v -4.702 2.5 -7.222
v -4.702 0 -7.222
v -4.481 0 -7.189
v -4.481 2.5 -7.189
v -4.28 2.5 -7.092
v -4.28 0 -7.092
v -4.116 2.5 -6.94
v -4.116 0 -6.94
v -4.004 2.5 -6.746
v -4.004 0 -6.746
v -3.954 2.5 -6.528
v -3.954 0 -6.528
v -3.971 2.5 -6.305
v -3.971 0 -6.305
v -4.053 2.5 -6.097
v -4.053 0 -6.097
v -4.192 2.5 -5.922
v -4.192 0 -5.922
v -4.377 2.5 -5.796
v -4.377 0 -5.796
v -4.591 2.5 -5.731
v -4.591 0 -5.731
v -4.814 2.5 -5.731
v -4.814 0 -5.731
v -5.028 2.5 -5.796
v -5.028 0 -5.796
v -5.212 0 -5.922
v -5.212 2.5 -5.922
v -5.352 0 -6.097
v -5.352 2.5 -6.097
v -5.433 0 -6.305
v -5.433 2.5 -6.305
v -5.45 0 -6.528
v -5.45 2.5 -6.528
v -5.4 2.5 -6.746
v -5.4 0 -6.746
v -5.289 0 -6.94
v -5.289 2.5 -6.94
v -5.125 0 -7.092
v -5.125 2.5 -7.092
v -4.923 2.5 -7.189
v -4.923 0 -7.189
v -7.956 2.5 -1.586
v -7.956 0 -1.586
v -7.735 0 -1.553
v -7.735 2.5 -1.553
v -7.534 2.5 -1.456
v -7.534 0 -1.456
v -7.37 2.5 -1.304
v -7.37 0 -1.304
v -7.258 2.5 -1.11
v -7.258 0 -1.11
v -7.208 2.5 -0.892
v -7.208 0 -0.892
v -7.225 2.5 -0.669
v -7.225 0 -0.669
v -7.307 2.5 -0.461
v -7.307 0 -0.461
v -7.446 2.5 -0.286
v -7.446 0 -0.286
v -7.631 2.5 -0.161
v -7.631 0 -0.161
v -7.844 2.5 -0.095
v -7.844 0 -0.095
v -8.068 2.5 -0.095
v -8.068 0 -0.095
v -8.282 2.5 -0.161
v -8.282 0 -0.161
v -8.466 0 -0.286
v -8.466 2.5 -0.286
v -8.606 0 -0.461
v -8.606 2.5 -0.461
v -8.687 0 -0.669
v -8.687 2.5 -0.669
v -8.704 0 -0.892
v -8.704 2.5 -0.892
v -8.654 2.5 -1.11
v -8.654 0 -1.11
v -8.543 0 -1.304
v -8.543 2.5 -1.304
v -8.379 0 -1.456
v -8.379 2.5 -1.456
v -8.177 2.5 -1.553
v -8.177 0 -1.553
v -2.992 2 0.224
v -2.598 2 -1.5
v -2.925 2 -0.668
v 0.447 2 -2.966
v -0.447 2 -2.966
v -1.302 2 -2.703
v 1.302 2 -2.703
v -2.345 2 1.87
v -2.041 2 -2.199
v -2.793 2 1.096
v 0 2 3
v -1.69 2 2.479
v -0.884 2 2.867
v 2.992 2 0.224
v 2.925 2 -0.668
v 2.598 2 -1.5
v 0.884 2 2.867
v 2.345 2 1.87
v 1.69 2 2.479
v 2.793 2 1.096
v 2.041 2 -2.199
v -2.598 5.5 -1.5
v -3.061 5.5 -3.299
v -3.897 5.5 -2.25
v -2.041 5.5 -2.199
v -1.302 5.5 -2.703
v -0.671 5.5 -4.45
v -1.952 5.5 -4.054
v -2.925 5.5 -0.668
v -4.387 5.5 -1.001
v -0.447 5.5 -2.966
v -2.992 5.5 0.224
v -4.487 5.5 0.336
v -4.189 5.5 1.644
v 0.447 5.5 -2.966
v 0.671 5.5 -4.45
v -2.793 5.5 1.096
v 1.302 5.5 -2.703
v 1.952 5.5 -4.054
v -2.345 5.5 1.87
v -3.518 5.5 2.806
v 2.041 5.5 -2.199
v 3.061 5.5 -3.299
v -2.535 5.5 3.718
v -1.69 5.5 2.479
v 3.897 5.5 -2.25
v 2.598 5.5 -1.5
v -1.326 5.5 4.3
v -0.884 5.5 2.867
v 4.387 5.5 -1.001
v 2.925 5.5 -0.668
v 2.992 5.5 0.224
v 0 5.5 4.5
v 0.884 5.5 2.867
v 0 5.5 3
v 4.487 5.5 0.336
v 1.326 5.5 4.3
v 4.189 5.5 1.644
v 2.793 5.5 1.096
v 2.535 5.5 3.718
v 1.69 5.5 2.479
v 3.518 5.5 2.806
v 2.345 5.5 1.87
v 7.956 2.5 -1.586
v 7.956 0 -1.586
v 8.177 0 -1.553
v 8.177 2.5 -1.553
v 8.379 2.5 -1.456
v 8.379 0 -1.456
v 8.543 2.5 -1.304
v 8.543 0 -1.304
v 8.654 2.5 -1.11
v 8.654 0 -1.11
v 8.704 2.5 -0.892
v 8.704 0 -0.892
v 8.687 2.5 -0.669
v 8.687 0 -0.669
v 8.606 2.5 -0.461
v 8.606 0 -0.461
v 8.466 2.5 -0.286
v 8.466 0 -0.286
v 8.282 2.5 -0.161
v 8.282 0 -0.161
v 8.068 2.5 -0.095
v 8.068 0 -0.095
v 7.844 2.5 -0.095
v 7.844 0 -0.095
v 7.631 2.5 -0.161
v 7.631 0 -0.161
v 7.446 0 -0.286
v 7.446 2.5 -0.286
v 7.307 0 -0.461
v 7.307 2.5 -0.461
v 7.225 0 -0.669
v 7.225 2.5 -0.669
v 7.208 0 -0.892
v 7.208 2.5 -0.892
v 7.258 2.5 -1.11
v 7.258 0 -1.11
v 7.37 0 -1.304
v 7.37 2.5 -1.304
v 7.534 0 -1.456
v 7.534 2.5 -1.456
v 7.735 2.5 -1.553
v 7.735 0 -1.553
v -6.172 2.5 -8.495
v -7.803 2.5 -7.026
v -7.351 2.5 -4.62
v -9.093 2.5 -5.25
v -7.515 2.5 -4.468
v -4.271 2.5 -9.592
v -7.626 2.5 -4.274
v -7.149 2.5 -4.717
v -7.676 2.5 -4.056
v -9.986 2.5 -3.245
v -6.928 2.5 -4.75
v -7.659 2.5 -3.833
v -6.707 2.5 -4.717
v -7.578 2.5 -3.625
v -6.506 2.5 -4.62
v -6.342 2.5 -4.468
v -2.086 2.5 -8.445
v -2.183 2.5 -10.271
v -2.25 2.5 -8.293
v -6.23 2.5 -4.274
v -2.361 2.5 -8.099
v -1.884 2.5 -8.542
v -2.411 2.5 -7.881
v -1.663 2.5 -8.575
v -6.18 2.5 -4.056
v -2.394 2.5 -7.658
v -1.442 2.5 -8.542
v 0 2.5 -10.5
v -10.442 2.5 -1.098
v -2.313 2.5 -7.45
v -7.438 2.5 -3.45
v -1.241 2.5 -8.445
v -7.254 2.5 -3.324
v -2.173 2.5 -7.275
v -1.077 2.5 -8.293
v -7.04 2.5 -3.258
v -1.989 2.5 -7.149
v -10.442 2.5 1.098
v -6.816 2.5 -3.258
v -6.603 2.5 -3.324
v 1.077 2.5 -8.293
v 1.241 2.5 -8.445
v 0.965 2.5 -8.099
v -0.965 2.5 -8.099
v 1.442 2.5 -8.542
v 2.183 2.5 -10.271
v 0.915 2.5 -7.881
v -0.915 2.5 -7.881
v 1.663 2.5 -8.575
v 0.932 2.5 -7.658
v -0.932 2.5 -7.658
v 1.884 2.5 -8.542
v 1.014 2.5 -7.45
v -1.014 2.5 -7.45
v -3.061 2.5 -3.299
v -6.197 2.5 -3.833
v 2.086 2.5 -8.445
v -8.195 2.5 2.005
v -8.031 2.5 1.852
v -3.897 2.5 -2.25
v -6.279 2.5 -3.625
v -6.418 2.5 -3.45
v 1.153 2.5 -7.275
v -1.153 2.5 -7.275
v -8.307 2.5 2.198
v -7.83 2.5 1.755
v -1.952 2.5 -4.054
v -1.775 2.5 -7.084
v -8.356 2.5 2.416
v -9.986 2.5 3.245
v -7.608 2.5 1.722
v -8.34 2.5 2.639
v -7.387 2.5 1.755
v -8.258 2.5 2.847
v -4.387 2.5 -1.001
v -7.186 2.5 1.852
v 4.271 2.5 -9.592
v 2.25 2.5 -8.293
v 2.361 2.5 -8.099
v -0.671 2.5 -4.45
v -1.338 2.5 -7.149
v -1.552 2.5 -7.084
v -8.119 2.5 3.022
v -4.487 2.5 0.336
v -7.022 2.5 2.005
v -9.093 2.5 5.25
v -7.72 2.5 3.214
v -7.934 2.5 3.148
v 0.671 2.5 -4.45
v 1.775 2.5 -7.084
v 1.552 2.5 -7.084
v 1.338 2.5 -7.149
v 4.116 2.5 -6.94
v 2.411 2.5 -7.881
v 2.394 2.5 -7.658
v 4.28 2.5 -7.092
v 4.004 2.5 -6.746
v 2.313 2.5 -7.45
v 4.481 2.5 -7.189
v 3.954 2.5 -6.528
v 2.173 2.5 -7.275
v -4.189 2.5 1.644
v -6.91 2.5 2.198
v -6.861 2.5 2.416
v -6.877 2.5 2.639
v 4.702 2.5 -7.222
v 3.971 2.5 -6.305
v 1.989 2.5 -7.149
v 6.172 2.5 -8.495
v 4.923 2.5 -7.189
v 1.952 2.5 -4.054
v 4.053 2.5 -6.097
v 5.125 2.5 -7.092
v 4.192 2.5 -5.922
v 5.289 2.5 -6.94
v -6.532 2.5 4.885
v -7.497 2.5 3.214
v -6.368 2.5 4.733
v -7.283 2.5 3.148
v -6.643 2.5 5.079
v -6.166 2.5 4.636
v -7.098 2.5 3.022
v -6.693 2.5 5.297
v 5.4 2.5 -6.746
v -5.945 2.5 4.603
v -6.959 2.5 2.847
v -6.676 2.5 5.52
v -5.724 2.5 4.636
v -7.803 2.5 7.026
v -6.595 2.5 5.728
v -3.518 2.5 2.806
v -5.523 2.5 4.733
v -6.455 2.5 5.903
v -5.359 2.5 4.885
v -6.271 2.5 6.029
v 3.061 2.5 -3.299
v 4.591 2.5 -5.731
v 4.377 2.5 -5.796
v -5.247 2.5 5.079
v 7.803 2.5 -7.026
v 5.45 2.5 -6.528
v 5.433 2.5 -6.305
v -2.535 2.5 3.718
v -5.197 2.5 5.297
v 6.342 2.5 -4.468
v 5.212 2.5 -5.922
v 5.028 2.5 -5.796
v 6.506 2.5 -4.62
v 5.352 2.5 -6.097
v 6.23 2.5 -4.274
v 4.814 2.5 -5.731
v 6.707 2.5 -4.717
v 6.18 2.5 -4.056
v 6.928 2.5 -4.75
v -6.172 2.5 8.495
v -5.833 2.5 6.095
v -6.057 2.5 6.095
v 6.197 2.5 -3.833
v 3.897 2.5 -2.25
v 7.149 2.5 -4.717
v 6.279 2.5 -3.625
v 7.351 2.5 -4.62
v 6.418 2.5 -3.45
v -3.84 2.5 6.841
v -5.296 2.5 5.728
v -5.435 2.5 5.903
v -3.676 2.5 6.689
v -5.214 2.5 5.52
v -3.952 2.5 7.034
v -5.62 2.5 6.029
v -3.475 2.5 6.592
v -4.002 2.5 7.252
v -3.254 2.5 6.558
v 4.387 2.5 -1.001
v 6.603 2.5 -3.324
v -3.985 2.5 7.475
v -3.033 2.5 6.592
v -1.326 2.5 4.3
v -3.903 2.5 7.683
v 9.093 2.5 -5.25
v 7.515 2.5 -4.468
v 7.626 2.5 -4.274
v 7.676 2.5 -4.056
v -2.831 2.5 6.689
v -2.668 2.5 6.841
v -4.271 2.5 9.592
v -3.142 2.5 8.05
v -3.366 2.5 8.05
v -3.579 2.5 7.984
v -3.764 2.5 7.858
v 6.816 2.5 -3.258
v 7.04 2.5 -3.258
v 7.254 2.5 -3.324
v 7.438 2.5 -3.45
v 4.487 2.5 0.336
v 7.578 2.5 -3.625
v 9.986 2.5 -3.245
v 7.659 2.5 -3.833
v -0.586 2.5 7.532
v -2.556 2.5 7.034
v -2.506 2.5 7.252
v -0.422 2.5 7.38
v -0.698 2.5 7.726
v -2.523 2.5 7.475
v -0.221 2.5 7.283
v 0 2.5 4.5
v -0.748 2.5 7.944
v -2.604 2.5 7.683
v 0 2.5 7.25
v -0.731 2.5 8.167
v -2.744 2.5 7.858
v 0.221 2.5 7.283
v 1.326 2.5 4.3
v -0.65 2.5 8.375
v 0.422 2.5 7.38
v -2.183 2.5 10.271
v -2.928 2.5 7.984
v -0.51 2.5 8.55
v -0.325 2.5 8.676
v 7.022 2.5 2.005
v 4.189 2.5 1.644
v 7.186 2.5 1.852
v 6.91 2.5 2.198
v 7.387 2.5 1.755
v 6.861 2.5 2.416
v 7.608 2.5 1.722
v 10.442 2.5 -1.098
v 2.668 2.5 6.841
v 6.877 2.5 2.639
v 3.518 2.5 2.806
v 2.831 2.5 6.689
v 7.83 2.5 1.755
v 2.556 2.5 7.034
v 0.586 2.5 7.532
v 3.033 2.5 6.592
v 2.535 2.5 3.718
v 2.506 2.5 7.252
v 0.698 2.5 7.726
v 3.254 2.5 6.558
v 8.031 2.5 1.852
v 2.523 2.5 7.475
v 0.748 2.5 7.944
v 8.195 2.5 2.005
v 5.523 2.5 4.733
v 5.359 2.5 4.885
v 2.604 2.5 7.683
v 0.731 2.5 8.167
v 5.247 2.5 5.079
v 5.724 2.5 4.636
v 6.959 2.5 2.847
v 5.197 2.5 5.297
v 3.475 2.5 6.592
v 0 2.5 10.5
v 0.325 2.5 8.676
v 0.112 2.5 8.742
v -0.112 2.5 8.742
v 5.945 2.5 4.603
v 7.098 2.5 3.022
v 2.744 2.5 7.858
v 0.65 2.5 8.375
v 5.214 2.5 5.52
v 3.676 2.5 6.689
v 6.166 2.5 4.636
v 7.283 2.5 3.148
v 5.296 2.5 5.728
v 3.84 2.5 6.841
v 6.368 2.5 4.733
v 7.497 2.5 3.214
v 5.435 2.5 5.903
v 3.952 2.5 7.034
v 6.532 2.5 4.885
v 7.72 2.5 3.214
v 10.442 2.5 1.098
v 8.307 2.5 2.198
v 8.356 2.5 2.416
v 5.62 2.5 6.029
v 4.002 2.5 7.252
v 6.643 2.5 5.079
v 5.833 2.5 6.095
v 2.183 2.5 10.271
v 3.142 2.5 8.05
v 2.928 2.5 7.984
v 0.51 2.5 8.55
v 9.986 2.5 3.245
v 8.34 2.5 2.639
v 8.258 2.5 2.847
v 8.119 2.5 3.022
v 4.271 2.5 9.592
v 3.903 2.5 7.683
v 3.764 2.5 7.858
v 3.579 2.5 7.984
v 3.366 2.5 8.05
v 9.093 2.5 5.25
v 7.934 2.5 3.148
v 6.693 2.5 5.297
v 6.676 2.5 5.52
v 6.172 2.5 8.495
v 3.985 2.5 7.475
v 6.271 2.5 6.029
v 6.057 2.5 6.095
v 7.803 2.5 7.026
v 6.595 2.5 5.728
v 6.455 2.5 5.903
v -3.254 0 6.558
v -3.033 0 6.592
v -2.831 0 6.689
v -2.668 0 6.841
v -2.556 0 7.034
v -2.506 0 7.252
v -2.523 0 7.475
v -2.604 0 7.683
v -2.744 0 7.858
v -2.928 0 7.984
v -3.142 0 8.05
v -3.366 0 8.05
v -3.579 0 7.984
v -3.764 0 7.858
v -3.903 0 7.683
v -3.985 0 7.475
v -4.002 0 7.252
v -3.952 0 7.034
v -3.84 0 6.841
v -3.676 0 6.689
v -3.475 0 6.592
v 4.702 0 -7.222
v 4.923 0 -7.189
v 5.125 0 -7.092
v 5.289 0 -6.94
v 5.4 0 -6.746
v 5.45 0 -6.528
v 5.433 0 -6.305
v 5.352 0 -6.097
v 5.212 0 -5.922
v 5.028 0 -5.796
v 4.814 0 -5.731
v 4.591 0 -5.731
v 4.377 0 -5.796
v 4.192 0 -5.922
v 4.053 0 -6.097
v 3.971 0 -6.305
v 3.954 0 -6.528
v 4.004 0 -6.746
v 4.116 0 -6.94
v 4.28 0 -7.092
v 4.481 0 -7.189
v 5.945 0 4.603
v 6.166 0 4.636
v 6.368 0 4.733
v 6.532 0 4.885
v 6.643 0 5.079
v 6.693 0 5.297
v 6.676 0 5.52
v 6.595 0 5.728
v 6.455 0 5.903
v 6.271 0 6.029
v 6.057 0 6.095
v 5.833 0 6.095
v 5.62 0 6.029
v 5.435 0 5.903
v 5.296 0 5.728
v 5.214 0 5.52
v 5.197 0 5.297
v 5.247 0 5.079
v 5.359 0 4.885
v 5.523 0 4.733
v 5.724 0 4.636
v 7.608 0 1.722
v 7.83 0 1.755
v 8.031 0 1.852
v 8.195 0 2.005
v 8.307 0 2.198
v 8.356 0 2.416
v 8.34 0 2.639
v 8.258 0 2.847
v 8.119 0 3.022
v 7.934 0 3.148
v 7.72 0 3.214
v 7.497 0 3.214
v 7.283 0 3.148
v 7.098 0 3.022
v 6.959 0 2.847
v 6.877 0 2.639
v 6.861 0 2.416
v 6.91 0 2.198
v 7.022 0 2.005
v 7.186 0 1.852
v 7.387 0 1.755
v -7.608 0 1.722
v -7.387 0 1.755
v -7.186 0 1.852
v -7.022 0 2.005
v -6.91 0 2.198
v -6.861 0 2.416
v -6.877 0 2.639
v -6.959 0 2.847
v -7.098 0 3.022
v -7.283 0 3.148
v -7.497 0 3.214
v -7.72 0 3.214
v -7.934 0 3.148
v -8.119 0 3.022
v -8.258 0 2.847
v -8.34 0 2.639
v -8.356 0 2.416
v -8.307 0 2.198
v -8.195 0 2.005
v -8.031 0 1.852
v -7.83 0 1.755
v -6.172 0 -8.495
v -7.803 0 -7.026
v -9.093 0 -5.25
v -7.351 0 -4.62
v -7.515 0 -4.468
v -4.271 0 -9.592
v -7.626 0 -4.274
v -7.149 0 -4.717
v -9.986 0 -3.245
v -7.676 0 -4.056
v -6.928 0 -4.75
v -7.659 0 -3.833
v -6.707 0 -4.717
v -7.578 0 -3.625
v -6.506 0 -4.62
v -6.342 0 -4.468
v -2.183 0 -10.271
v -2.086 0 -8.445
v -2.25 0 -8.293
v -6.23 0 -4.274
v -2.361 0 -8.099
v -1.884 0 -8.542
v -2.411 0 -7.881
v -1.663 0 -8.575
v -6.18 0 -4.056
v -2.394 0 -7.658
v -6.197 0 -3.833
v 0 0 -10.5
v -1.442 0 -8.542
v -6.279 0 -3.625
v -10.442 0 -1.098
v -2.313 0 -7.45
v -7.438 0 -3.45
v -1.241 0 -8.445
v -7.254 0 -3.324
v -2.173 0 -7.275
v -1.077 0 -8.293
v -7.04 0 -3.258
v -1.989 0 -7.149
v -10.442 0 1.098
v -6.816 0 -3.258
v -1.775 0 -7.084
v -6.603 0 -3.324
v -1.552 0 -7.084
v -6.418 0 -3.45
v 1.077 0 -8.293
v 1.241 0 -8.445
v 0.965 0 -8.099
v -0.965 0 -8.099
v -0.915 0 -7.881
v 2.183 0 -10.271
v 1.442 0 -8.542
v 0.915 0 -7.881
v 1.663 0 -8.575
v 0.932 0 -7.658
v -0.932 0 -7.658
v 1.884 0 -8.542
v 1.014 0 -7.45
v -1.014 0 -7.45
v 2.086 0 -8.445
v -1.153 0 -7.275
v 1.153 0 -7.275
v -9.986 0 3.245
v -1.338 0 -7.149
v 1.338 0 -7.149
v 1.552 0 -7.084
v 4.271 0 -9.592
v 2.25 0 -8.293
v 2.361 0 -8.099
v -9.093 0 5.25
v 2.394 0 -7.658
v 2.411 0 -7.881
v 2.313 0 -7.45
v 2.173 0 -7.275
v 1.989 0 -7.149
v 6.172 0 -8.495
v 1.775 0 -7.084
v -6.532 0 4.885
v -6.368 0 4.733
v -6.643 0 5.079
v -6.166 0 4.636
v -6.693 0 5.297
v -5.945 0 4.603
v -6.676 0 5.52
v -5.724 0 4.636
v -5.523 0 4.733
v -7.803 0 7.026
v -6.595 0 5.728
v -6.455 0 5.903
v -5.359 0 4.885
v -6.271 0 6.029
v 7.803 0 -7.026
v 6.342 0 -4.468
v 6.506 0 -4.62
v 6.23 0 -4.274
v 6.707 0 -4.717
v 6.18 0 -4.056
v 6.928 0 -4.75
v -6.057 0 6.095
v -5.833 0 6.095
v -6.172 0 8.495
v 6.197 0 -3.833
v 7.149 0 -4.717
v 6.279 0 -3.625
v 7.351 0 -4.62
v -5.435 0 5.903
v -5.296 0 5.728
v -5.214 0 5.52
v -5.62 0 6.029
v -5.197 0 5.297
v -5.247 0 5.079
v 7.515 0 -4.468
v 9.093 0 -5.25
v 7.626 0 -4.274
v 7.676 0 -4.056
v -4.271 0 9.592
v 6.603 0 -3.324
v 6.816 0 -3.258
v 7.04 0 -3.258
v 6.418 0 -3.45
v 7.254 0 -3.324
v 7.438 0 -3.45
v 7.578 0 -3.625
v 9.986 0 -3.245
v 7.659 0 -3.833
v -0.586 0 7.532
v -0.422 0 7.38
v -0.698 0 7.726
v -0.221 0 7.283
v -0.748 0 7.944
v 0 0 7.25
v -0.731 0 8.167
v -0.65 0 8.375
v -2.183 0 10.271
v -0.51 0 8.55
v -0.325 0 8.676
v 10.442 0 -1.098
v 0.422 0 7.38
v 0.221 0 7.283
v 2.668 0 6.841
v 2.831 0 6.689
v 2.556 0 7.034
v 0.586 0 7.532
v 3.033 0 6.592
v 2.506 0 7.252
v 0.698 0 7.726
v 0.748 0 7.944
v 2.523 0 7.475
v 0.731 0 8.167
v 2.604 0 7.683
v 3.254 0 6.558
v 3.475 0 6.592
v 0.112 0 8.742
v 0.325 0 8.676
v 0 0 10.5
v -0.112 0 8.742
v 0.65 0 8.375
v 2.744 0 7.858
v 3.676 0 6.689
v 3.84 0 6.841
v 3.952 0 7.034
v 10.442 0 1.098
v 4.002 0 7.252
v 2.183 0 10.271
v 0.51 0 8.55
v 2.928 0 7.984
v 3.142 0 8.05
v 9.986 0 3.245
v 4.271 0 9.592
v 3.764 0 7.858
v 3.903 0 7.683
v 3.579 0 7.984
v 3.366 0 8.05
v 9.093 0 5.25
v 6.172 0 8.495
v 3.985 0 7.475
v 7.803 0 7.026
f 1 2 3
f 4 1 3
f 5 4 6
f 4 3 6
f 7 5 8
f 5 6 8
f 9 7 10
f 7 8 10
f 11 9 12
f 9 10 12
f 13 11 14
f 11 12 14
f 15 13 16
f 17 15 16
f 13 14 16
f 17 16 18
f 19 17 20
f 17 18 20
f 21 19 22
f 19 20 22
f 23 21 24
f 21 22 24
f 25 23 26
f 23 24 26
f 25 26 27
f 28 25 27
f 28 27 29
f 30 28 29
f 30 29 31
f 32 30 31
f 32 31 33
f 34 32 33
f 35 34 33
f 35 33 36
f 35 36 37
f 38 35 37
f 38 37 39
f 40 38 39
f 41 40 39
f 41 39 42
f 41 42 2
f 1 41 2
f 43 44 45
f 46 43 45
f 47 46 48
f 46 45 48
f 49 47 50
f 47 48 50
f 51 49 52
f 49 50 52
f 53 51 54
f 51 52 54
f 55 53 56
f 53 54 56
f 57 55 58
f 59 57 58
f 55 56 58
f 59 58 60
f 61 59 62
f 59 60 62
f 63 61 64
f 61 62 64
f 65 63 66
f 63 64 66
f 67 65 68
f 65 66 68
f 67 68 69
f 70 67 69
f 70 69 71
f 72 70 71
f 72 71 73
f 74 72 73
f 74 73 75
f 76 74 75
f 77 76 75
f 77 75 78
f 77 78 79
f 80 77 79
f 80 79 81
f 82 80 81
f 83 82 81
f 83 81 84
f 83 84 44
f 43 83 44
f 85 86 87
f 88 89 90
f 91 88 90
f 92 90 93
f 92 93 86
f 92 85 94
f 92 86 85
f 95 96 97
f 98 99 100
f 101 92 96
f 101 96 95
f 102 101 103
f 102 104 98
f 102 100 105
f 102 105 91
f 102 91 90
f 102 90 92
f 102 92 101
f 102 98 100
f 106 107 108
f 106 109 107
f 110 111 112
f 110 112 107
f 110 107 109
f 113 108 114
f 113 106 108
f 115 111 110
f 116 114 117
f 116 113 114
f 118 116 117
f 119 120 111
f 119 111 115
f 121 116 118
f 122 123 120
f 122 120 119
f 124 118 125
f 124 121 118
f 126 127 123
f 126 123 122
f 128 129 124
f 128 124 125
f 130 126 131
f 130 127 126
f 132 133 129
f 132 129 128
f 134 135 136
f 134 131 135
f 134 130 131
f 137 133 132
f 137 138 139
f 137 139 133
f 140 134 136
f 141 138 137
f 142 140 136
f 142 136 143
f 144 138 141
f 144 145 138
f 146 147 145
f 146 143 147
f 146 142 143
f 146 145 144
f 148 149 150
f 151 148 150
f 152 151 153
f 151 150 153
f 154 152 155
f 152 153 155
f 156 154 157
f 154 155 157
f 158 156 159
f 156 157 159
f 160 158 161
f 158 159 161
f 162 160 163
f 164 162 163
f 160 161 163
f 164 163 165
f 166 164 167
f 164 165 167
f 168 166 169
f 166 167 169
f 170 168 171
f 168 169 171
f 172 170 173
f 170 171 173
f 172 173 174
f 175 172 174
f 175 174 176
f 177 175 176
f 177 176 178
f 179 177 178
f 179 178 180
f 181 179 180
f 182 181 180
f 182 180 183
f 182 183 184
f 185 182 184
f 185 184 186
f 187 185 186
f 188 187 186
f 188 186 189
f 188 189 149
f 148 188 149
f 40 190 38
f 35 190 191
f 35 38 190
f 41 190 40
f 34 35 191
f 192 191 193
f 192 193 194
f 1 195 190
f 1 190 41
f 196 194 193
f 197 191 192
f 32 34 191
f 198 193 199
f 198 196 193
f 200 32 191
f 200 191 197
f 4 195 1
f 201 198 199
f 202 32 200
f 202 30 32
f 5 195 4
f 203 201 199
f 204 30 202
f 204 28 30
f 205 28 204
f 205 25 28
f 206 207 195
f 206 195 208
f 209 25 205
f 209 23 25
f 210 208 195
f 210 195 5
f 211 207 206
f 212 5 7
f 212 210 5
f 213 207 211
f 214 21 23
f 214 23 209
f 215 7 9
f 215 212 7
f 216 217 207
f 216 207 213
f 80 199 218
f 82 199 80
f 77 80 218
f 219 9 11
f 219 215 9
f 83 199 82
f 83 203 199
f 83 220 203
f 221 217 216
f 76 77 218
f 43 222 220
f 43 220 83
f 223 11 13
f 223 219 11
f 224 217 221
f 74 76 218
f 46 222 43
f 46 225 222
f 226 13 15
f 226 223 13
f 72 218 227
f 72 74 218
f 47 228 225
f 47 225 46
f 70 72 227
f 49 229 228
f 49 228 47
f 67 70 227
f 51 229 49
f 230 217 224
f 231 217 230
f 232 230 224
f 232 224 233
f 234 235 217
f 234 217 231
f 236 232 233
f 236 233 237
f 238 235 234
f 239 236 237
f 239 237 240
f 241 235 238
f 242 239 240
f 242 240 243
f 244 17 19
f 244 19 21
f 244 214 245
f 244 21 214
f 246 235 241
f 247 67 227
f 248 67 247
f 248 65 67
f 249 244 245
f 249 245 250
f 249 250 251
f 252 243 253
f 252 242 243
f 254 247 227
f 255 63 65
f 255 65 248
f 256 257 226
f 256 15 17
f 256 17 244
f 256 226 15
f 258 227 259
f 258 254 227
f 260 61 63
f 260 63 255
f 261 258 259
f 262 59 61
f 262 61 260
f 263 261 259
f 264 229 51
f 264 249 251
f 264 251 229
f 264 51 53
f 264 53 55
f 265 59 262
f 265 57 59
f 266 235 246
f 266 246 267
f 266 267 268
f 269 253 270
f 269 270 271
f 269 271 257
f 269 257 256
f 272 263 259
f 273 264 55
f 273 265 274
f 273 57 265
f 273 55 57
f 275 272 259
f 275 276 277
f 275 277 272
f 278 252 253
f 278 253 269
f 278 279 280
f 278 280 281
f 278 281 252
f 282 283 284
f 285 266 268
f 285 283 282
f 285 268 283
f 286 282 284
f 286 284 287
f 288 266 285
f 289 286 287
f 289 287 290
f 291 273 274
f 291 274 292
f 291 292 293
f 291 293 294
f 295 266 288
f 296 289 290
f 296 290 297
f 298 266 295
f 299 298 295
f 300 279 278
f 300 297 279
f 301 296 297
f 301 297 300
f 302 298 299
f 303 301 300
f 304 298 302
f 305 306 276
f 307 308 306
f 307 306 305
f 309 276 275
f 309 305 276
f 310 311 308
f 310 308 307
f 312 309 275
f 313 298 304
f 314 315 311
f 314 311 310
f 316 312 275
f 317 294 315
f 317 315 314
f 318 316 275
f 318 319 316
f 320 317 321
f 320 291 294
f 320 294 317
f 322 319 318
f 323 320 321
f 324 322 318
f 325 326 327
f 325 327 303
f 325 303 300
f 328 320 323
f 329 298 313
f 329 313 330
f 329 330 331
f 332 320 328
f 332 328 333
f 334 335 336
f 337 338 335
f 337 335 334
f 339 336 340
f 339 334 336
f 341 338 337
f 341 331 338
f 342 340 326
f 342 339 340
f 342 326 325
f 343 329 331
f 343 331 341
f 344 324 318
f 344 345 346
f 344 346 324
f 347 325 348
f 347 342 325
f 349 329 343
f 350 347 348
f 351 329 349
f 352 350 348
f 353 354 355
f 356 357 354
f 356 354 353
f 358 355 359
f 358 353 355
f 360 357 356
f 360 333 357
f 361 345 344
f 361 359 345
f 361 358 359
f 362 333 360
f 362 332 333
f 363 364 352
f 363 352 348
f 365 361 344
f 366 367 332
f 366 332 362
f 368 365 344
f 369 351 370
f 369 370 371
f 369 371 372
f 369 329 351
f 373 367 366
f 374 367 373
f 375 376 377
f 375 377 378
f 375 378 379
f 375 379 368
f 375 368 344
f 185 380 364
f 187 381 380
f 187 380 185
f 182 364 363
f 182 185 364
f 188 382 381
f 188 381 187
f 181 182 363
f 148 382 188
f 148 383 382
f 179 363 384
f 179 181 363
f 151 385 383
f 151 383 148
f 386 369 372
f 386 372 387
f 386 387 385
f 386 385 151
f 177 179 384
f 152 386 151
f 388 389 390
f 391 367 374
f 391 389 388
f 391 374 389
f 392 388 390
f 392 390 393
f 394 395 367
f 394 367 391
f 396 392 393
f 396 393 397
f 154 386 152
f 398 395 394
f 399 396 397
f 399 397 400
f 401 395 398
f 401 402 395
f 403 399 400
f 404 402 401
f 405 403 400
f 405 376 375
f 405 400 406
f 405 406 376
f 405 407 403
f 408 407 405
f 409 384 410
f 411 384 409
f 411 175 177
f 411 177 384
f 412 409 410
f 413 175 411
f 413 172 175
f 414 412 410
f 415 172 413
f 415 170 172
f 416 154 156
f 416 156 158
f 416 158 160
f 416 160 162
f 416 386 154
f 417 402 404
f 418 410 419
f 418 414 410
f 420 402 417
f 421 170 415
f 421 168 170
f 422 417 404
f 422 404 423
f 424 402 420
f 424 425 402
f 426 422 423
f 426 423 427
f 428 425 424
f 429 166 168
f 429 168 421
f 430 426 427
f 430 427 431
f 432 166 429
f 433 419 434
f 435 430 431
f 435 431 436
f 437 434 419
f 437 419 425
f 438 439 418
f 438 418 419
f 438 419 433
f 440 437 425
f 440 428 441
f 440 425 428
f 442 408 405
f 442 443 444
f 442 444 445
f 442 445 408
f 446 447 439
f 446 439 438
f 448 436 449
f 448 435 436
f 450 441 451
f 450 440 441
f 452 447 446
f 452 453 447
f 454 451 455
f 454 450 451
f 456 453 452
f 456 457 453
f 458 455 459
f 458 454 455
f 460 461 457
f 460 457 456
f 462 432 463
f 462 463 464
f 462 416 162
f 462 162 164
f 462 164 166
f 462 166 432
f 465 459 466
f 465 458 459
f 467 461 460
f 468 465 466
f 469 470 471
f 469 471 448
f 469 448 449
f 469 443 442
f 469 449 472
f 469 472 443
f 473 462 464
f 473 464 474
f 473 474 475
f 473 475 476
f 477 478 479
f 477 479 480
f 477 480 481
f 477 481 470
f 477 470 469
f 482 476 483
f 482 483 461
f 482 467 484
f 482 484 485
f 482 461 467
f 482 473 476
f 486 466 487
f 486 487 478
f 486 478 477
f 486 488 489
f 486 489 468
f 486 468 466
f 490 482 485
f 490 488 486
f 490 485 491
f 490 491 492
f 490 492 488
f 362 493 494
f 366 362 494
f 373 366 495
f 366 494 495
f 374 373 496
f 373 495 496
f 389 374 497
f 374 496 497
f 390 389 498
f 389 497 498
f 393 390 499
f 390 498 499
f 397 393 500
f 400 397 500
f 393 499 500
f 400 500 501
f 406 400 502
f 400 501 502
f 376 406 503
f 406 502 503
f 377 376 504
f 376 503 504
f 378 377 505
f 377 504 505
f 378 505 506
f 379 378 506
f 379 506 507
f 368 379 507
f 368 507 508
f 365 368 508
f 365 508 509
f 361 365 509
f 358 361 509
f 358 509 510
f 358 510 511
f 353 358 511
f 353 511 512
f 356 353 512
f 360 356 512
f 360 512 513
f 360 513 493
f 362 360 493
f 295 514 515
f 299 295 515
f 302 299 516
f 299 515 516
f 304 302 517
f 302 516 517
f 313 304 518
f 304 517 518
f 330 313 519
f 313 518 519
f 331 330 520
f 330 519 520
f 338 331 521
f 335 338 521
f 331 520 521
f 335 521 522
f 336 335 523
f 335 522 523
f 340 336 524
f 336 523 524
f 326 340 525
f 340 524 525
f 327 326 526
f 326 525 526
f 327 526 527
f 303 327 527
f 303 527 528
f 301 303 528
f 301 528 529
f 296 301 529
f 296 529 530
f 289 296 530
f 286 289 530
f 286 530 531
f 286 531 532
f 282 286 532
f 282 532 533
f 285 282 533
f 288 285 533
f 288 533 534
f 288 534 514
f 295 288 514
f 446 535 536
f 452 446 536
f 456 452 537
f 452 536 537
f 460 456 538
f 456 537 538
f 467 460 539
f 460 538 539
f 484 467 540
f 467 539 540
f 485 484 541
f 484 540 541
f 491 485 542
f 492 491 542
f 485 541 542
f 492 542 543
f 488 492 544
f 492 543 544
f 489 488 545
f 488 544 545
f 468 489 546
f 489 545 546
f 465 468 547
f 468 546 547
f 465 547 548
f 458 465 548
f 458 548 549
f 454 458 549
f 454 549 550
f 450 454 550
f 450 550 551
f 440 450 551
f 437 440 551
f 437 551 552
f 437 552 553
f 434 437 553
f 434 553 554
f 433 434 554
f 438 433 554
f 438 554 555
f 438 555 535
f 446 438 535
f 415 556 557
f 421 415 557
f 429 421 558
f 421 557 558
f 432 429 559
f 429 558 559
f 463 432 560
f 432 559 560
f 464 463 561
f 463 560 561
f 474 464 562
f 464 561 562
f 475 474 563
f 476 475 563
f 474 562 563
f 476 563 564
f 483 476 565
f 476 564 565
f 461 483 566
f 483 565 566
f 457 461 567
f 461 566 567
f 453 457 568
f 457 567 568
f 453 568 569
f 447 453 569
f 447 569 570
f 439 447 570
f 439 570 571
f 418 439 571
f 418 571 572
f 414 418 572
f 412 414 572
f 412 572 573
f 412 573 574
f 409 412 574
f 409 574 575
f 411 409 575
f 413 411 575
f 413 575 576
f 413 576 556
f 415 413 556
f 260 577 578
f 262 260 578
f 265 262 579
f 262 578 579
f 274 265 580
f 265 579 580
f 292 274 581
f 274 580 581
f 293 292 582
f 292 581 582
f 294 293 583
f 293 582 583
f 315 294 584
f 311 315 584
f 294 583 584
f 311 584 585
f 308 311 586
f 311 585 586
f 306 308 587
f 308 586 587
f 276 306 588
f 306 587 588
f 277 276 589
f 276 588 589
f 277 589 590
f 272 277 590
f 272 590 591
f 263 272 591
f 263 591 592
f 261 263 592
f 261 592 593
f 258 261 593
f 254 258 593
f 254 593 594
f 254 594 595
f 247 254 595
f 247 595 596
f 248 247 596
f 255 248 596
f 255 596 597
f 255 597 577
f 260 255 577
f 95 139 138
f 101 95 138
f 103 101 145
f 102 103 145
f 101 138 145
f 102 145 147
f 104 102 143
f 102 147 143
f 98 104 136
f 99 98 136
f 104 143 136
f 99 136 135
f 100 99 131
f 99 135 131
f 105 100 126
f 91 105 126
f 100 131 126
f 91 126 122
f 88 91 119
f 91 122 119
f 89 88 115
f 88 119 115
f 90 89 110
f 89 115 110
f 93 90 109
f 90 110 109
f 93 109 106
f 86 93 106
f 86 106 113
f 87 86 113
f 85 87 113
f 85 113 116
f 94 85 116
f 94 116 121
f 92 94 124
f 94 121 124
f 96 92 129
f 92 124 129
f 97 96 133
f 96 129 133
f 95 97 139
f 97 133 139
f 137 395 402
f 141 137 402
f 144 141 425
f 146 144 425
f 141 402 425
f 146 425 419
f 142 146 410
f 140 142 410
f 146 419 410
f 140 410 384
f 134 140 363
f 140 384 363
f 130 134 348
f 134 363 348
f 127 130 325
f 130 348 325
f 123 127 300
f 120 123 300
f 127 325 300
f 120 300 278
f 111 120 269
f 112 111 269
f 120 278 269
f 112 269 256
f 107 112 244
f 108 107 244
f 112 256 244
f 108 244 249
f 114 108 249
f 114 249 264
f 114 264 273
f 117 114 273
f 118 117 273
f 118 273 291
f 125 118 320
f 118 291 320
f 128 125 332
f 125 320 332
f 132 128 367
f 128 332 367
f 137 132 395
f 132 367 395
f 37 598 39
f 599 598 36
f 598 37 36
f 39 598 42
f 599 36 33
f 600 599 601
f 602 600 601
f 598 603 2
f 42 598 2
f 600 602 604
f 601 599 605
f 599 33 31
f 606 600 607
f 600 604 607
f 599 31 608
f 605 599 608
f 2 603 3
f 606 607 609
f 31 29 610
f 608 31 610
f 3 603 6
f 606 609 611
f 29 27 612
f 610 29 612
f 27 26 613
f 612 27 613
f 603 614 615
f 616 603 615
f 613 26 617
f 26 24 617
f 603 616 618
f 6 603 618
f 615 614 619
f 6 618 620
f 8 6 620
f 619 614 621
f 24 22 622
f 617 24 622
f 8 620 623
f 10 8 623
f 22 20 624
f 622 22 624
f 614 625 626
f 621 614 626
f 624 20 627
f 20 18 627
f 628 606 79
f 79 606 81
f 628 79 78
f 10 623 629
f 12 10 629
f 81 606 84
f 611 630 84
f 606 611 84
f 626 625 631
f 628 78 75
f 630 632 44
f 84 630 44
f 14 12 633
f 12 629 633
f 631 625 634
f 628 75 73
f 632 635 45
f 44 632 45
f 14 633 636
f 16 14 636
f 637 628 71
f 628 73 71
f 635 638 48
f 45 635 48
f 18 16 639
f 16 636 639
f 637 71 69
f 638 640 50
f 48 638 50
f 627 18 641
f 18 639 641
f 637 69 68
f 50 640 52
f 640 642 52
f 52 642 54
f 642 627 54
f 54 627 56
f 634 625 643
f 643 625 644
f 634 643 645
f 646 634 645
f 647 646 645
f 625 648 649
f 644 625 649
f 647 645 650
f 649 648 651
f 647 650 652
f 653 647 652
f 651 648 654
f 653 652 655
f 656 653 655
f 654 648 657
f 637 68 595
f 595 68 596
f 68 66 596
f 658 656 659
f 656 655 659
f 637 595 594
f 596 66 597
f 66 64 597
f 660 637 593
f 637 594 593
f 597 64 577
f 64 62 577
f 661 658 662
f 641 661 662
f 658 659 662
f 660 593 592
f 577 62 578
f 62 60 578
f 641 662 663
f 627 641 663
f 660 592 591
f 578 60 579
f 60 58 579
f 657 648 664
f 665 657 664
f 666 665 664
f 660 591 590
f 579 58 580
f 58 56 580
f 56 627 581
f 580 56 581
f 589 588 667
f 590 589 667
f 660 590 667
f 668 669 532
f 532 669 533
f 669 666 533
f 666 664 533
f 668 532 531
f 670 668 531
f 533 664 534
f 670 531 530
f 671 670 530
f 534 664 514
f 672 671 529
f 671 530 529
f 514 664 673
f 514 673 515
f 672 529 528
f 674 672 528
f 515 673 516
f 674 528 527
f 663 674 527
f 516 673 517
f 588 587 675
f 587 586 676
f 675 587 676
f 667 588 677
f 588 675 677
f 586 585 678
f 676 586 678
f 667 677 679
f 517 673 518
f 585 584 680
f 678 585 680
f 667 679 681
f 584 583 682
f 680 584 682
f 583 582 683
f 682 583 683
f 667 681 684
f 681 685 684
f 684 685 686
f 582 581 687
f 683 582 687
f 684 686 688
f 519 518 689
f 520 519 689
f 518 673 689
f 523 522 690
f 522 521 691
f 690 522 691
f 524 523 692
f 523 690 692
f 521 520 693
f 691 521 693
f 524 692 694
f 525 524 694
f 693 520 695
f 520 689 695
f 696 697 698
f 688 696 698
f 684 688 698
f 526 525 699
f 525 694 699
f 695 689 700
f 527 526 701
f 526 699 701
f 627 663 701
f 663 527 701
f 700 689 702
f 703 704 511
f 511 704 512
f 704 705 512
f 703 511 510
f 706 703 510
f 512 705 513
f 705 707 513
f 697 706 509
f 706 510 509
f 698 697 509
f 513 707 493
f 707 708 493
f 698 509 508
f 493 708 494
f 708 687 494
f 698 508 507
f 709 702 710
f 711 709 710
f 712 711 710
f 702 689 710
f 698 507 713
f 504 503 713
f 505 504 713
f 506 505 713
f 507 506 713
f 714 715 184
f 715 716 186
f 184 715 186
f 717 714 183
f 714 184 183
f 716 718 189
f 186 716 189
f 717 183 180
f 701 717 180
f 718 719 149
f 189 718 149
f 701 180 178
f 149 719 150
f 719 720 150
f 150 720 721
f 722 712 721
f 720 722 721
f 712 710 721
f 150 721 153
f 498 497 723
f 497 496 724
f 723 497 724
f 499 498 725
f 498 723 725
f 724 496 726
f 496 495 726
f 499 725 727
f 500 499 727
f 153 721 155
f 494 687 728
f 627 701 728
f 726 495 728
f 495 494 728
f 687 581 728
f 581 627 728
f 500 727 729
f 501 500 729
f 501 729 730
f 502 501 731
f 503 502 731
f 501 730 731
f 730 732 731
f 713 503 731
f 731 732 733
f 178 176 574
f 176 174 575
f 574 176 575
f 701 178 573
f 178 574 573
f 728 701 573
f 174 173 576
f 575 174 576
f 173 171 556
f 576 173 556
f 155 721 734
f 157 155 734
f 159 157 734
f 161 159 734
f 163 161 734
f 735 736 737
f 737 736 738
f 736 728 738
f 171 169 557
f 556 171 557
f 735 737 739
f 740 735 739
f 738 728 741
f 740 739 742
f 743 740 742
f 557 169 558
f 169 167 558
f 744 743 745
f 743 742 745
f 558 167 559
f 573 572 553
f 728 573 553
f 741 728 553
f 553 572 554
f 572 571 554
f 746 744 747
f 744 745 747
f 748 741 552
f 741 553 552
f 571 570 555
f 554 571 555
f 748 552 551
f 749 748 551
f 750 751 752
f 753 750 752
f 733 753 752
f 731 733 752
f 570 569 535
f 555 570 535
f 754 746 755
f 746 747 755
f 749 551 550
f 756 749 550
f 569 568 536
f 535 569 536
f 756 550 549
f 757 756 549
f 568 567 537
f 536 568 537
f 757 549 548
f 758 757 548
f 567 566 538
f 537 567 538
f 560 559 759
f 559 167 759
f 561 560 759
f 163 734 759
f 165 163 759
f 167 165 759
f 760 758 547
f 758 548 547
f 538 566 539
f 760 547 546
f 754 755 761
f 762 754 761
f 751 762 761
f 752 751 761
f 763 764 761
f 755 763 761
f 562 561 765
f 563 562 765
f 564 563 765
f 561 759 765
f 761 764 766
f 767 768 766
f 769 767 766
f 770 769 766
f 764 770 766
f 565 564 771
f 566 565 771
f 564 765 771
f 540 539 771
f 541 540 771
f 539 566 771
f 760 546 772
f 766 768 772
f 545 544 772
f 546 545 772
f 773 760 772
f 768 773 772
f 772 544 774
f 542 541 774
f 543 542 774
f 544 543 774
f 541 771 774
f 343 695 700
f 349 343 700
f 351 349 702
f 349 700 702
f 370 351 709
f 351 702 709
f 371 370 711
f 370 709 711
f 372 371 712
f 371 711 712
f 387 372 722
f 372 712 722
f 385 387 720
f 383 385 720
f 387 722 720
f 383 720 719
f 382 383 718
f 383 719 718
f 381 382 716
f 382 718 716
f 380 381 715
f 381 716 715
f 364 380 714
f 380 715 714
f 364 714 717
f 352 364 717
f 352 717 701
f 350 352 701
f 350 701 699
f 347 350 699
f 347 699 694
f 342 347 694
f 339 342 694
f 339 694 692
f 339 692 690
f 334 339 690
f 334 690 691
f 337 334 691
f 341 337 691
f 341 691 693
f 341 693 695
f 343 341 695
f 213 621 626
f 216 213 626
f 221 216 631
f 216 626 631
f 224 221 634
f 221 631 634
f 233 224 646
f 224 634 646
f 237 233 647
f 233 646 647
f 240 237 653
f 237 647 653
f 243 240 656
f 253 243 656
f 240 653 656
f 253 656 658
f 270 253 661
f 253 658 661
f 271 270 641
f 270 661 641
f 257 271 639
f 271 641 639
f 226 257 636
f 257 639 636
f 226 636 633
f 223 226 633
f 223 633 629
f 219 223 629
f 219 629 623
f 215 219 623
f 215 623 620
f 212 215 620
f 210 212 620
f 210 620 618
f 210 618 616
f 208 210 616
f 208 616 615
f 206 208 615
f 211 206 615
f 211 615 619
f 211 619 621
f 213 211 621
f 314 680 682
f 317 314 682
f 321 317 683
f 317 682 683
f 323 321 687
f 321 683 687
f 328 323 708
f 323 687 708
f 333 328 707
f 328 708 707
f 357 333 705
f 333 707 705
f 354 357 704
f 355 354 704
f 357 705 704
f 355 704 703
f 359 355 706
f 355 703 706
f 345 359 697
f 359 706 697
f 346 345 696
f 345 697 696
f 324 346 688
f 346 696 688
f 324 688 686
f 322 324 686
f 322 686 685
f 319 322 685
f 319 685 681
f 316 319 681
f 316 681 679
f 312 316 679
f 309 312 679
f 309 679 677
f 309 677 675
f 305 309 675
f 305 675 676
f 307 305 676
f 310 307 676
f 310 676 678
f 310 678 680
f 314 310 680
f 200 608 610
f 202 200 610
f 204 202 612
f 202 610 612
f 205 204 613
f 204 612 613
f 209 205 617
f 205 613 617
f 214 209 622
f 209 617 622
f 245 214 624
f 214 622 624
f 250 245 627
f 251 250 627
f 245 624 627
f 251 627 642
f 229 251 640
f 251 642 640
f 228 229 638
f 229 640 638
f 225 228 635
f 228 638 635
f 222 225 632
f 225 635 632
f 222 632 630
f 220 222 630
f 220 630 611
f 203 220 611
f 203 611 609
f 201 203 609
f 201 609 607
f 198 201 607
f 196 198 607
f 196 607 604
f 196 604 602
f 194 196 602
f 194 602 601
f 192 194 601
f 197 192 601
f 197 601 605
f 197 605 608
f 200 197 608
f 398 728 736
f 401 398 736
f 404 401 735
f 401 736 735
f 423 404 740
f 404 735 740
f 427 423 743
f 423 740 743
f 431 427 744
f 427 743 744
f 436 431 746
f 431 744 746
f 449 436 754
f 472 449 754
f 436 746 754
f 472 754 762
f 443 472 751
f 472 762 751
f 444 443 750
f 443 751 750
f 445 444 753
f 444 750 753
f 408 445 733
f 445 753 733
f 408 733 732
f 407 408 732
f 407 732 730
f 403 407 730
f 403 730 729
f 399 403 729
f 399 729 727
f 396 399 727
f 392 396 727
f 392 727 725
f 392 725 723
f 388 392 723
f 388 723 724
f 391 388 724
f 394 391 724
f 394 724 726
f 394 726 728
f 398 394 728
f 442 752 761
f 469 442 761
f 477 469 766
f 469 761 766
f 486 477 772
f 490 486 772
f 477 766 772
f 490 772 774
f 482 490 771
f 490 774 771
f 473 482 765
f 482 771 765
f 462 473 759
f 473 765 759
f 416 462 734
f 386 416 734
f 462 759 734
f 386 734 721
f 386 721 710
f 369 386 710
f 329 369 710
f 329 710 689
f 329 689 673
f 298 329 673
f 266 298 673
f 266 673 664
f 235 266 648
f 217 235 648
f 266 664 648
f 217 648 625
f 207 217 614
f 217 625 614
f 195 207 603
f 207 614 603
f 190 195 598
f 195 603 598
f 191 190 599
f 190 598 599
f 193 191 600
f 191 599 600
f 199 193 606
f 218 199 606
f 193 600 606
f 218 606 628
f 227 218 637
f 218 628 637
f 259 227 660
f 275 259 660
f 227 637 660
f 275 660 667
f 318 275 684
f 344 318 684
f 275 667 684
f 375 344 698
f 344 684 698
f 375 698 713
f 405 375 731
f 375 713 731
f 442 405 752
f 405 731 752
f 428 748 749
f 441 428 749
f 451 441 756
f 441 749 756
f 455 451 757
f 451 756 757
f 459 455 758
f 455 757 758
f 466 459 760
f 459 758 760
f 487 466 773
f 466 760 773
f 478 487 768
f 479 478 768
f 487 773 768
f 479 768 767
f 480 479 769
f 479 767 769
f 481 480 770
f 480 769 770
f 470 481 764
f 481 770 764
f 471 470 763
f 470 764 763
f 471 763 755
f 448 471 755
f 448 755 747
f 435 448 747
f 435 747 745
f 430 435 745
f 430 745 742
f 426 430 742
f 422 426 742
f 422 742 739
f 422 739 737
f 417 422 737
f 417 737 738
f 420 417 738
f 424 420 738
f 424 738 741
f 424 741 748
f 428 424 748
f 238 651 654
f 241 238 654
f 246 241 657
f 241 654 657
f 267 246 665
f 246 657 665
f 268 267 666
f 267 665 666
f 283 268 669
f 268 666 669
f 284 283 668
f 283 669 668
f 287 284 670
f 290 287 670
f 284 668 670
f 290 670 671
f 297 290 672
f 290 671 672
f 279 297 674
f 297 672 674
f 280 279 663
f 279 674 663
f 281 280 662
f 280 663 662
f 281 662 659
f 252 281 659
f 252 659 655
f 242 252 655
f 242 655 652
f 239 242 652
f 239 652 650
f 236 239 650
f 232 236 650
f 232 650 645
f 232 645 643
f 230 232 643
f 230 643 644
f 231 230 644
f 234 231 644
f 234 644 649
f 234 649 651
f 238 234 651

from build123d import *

# Parameters (mm, degrees)
SKETCH_1_R          = 10.5
EXTRUDE_1_DEPTH     = 2.5
SKETCH_2_R          = 4.5
EXTRUDE_2_DEPTH     = 3
SKETCH_3_R          = 3
CUT_EXTRUDE_1_DEPTH = 3.5
SKETCH_4_R          = 0.75
CUT_EXTRUDE_2_DEPTH = 4


with BuildPart() as part:
    # 草图1 → 凸台-拉伸1 (new body)
    with BuildSketch(Plane(origin=(0, 0, 0), x_dir=(1, 0, 0), z_dir=(0, 1, 0))):
        with Locations(Location((0, 0, 0), (0, 0, 270))):
            Circle(SKETCH_1_R)
    extrude(amount=EXTRUDE_1_DEPTH)

    # 草图2 → 凸台-拉伸2 (add)
    with BuildSketch(Plane(origin=(0, 2.5, 0), x_dir=(1, 0, 0), z_dir=(0, 1, 0))):
        with Locations(Location((0, 0, 0), (0, 0, 270))):
            Circle(SKETCH_2_R)
    extrude(amount=EXTRUDE_2_DEPTH)

    # 草图3 → 切除-拉伸1 (cut)
    with BuildSketch(Plane(origin=(0, 5.5, 0), x_dir=(1, 0, 0), z_dir=(0, 1, 0))):
        with Locations(Location((0, 0, 0), (0, 0, 270))):
            Circle(SKETCH_3_R)
    extrude(amount=-CUT_EXTRUDE_1_DEPTH, mode=Mode.SUBTRACT)

    # 草图4 → 切除-拉伸2 (cut)
    with BuildSketch(Plane.XZ):
        with Locations(Location((0, 8, 0), (0, 0, 270))):
            Circle(SKETCH_4_R)
        with Locations(Location((3.253893145, 7.308363661, 0), (0, 0, 270))):
            Circle(SKETCH_4_R)
        with Locations(Location((5.945158604, 5.353044851, 0), (0, 0, 270))):
            Circle(SKETCH_4_R)
        with Locations(Location((7.60845213, 2.472135955, 0), (0, 0, 270))):
            Circle(SKETCH_4_R)
        with Locations(Location((7.956175163, -0.836227706, 0), (0, 0, 270))):
            Circle(SKETCH_4_R)
        with Locations(Location((6.92820323, -4, 0), (0, 0, 270))):
            Circle(SKETCH_4_R)
        with Locations(Location((4.702282018, -6.472135955, 0), (0, 0, 270))):
            Circle(SKETCH_4_R)
        with Locations(Location((1.663293527, -7.825180806, 0), (0, 0, 270))):
            Circle(SKETCH_4_R)
        with Locations(Location((-1.663293527, -7.825180806, 0), (0, 0, 270))):
            Circle(SKETCH_4_R)
        with Locations(Location((-4.702282018, -6.472135955, 0), (0, 0, 270))):
            Circle(SKETCH_4_R)
        with Locations(Location((-6.92820323, -4, 0), (0, 0, 270))):
            Circle(SKETCH_4_R)
        with Locations(Location((-7.956175163, -0.836227706, 0), (0, 0, 270))):
            Circle(SKETCH_4_R)
        with Locations(Location((-7.60845213, 2.472135955, 0), (0, 0, 270))):
            Circle(SKETCH_4_R)
        with Locations(Location((-5.945158604, 5.353044851, 0), (0, 0, 270))):
            Circle(SKETCH_4_R)
        with Locations(Location((-3.253893145, 7.308363661, 0), (0, 0, 270))):
            Circle(SKETCH_4_R)
    extrude(amount=-CUT_EXTRUDE_2_DEPTH, mode=Mode.SUBTRACT)


solid = part.part
